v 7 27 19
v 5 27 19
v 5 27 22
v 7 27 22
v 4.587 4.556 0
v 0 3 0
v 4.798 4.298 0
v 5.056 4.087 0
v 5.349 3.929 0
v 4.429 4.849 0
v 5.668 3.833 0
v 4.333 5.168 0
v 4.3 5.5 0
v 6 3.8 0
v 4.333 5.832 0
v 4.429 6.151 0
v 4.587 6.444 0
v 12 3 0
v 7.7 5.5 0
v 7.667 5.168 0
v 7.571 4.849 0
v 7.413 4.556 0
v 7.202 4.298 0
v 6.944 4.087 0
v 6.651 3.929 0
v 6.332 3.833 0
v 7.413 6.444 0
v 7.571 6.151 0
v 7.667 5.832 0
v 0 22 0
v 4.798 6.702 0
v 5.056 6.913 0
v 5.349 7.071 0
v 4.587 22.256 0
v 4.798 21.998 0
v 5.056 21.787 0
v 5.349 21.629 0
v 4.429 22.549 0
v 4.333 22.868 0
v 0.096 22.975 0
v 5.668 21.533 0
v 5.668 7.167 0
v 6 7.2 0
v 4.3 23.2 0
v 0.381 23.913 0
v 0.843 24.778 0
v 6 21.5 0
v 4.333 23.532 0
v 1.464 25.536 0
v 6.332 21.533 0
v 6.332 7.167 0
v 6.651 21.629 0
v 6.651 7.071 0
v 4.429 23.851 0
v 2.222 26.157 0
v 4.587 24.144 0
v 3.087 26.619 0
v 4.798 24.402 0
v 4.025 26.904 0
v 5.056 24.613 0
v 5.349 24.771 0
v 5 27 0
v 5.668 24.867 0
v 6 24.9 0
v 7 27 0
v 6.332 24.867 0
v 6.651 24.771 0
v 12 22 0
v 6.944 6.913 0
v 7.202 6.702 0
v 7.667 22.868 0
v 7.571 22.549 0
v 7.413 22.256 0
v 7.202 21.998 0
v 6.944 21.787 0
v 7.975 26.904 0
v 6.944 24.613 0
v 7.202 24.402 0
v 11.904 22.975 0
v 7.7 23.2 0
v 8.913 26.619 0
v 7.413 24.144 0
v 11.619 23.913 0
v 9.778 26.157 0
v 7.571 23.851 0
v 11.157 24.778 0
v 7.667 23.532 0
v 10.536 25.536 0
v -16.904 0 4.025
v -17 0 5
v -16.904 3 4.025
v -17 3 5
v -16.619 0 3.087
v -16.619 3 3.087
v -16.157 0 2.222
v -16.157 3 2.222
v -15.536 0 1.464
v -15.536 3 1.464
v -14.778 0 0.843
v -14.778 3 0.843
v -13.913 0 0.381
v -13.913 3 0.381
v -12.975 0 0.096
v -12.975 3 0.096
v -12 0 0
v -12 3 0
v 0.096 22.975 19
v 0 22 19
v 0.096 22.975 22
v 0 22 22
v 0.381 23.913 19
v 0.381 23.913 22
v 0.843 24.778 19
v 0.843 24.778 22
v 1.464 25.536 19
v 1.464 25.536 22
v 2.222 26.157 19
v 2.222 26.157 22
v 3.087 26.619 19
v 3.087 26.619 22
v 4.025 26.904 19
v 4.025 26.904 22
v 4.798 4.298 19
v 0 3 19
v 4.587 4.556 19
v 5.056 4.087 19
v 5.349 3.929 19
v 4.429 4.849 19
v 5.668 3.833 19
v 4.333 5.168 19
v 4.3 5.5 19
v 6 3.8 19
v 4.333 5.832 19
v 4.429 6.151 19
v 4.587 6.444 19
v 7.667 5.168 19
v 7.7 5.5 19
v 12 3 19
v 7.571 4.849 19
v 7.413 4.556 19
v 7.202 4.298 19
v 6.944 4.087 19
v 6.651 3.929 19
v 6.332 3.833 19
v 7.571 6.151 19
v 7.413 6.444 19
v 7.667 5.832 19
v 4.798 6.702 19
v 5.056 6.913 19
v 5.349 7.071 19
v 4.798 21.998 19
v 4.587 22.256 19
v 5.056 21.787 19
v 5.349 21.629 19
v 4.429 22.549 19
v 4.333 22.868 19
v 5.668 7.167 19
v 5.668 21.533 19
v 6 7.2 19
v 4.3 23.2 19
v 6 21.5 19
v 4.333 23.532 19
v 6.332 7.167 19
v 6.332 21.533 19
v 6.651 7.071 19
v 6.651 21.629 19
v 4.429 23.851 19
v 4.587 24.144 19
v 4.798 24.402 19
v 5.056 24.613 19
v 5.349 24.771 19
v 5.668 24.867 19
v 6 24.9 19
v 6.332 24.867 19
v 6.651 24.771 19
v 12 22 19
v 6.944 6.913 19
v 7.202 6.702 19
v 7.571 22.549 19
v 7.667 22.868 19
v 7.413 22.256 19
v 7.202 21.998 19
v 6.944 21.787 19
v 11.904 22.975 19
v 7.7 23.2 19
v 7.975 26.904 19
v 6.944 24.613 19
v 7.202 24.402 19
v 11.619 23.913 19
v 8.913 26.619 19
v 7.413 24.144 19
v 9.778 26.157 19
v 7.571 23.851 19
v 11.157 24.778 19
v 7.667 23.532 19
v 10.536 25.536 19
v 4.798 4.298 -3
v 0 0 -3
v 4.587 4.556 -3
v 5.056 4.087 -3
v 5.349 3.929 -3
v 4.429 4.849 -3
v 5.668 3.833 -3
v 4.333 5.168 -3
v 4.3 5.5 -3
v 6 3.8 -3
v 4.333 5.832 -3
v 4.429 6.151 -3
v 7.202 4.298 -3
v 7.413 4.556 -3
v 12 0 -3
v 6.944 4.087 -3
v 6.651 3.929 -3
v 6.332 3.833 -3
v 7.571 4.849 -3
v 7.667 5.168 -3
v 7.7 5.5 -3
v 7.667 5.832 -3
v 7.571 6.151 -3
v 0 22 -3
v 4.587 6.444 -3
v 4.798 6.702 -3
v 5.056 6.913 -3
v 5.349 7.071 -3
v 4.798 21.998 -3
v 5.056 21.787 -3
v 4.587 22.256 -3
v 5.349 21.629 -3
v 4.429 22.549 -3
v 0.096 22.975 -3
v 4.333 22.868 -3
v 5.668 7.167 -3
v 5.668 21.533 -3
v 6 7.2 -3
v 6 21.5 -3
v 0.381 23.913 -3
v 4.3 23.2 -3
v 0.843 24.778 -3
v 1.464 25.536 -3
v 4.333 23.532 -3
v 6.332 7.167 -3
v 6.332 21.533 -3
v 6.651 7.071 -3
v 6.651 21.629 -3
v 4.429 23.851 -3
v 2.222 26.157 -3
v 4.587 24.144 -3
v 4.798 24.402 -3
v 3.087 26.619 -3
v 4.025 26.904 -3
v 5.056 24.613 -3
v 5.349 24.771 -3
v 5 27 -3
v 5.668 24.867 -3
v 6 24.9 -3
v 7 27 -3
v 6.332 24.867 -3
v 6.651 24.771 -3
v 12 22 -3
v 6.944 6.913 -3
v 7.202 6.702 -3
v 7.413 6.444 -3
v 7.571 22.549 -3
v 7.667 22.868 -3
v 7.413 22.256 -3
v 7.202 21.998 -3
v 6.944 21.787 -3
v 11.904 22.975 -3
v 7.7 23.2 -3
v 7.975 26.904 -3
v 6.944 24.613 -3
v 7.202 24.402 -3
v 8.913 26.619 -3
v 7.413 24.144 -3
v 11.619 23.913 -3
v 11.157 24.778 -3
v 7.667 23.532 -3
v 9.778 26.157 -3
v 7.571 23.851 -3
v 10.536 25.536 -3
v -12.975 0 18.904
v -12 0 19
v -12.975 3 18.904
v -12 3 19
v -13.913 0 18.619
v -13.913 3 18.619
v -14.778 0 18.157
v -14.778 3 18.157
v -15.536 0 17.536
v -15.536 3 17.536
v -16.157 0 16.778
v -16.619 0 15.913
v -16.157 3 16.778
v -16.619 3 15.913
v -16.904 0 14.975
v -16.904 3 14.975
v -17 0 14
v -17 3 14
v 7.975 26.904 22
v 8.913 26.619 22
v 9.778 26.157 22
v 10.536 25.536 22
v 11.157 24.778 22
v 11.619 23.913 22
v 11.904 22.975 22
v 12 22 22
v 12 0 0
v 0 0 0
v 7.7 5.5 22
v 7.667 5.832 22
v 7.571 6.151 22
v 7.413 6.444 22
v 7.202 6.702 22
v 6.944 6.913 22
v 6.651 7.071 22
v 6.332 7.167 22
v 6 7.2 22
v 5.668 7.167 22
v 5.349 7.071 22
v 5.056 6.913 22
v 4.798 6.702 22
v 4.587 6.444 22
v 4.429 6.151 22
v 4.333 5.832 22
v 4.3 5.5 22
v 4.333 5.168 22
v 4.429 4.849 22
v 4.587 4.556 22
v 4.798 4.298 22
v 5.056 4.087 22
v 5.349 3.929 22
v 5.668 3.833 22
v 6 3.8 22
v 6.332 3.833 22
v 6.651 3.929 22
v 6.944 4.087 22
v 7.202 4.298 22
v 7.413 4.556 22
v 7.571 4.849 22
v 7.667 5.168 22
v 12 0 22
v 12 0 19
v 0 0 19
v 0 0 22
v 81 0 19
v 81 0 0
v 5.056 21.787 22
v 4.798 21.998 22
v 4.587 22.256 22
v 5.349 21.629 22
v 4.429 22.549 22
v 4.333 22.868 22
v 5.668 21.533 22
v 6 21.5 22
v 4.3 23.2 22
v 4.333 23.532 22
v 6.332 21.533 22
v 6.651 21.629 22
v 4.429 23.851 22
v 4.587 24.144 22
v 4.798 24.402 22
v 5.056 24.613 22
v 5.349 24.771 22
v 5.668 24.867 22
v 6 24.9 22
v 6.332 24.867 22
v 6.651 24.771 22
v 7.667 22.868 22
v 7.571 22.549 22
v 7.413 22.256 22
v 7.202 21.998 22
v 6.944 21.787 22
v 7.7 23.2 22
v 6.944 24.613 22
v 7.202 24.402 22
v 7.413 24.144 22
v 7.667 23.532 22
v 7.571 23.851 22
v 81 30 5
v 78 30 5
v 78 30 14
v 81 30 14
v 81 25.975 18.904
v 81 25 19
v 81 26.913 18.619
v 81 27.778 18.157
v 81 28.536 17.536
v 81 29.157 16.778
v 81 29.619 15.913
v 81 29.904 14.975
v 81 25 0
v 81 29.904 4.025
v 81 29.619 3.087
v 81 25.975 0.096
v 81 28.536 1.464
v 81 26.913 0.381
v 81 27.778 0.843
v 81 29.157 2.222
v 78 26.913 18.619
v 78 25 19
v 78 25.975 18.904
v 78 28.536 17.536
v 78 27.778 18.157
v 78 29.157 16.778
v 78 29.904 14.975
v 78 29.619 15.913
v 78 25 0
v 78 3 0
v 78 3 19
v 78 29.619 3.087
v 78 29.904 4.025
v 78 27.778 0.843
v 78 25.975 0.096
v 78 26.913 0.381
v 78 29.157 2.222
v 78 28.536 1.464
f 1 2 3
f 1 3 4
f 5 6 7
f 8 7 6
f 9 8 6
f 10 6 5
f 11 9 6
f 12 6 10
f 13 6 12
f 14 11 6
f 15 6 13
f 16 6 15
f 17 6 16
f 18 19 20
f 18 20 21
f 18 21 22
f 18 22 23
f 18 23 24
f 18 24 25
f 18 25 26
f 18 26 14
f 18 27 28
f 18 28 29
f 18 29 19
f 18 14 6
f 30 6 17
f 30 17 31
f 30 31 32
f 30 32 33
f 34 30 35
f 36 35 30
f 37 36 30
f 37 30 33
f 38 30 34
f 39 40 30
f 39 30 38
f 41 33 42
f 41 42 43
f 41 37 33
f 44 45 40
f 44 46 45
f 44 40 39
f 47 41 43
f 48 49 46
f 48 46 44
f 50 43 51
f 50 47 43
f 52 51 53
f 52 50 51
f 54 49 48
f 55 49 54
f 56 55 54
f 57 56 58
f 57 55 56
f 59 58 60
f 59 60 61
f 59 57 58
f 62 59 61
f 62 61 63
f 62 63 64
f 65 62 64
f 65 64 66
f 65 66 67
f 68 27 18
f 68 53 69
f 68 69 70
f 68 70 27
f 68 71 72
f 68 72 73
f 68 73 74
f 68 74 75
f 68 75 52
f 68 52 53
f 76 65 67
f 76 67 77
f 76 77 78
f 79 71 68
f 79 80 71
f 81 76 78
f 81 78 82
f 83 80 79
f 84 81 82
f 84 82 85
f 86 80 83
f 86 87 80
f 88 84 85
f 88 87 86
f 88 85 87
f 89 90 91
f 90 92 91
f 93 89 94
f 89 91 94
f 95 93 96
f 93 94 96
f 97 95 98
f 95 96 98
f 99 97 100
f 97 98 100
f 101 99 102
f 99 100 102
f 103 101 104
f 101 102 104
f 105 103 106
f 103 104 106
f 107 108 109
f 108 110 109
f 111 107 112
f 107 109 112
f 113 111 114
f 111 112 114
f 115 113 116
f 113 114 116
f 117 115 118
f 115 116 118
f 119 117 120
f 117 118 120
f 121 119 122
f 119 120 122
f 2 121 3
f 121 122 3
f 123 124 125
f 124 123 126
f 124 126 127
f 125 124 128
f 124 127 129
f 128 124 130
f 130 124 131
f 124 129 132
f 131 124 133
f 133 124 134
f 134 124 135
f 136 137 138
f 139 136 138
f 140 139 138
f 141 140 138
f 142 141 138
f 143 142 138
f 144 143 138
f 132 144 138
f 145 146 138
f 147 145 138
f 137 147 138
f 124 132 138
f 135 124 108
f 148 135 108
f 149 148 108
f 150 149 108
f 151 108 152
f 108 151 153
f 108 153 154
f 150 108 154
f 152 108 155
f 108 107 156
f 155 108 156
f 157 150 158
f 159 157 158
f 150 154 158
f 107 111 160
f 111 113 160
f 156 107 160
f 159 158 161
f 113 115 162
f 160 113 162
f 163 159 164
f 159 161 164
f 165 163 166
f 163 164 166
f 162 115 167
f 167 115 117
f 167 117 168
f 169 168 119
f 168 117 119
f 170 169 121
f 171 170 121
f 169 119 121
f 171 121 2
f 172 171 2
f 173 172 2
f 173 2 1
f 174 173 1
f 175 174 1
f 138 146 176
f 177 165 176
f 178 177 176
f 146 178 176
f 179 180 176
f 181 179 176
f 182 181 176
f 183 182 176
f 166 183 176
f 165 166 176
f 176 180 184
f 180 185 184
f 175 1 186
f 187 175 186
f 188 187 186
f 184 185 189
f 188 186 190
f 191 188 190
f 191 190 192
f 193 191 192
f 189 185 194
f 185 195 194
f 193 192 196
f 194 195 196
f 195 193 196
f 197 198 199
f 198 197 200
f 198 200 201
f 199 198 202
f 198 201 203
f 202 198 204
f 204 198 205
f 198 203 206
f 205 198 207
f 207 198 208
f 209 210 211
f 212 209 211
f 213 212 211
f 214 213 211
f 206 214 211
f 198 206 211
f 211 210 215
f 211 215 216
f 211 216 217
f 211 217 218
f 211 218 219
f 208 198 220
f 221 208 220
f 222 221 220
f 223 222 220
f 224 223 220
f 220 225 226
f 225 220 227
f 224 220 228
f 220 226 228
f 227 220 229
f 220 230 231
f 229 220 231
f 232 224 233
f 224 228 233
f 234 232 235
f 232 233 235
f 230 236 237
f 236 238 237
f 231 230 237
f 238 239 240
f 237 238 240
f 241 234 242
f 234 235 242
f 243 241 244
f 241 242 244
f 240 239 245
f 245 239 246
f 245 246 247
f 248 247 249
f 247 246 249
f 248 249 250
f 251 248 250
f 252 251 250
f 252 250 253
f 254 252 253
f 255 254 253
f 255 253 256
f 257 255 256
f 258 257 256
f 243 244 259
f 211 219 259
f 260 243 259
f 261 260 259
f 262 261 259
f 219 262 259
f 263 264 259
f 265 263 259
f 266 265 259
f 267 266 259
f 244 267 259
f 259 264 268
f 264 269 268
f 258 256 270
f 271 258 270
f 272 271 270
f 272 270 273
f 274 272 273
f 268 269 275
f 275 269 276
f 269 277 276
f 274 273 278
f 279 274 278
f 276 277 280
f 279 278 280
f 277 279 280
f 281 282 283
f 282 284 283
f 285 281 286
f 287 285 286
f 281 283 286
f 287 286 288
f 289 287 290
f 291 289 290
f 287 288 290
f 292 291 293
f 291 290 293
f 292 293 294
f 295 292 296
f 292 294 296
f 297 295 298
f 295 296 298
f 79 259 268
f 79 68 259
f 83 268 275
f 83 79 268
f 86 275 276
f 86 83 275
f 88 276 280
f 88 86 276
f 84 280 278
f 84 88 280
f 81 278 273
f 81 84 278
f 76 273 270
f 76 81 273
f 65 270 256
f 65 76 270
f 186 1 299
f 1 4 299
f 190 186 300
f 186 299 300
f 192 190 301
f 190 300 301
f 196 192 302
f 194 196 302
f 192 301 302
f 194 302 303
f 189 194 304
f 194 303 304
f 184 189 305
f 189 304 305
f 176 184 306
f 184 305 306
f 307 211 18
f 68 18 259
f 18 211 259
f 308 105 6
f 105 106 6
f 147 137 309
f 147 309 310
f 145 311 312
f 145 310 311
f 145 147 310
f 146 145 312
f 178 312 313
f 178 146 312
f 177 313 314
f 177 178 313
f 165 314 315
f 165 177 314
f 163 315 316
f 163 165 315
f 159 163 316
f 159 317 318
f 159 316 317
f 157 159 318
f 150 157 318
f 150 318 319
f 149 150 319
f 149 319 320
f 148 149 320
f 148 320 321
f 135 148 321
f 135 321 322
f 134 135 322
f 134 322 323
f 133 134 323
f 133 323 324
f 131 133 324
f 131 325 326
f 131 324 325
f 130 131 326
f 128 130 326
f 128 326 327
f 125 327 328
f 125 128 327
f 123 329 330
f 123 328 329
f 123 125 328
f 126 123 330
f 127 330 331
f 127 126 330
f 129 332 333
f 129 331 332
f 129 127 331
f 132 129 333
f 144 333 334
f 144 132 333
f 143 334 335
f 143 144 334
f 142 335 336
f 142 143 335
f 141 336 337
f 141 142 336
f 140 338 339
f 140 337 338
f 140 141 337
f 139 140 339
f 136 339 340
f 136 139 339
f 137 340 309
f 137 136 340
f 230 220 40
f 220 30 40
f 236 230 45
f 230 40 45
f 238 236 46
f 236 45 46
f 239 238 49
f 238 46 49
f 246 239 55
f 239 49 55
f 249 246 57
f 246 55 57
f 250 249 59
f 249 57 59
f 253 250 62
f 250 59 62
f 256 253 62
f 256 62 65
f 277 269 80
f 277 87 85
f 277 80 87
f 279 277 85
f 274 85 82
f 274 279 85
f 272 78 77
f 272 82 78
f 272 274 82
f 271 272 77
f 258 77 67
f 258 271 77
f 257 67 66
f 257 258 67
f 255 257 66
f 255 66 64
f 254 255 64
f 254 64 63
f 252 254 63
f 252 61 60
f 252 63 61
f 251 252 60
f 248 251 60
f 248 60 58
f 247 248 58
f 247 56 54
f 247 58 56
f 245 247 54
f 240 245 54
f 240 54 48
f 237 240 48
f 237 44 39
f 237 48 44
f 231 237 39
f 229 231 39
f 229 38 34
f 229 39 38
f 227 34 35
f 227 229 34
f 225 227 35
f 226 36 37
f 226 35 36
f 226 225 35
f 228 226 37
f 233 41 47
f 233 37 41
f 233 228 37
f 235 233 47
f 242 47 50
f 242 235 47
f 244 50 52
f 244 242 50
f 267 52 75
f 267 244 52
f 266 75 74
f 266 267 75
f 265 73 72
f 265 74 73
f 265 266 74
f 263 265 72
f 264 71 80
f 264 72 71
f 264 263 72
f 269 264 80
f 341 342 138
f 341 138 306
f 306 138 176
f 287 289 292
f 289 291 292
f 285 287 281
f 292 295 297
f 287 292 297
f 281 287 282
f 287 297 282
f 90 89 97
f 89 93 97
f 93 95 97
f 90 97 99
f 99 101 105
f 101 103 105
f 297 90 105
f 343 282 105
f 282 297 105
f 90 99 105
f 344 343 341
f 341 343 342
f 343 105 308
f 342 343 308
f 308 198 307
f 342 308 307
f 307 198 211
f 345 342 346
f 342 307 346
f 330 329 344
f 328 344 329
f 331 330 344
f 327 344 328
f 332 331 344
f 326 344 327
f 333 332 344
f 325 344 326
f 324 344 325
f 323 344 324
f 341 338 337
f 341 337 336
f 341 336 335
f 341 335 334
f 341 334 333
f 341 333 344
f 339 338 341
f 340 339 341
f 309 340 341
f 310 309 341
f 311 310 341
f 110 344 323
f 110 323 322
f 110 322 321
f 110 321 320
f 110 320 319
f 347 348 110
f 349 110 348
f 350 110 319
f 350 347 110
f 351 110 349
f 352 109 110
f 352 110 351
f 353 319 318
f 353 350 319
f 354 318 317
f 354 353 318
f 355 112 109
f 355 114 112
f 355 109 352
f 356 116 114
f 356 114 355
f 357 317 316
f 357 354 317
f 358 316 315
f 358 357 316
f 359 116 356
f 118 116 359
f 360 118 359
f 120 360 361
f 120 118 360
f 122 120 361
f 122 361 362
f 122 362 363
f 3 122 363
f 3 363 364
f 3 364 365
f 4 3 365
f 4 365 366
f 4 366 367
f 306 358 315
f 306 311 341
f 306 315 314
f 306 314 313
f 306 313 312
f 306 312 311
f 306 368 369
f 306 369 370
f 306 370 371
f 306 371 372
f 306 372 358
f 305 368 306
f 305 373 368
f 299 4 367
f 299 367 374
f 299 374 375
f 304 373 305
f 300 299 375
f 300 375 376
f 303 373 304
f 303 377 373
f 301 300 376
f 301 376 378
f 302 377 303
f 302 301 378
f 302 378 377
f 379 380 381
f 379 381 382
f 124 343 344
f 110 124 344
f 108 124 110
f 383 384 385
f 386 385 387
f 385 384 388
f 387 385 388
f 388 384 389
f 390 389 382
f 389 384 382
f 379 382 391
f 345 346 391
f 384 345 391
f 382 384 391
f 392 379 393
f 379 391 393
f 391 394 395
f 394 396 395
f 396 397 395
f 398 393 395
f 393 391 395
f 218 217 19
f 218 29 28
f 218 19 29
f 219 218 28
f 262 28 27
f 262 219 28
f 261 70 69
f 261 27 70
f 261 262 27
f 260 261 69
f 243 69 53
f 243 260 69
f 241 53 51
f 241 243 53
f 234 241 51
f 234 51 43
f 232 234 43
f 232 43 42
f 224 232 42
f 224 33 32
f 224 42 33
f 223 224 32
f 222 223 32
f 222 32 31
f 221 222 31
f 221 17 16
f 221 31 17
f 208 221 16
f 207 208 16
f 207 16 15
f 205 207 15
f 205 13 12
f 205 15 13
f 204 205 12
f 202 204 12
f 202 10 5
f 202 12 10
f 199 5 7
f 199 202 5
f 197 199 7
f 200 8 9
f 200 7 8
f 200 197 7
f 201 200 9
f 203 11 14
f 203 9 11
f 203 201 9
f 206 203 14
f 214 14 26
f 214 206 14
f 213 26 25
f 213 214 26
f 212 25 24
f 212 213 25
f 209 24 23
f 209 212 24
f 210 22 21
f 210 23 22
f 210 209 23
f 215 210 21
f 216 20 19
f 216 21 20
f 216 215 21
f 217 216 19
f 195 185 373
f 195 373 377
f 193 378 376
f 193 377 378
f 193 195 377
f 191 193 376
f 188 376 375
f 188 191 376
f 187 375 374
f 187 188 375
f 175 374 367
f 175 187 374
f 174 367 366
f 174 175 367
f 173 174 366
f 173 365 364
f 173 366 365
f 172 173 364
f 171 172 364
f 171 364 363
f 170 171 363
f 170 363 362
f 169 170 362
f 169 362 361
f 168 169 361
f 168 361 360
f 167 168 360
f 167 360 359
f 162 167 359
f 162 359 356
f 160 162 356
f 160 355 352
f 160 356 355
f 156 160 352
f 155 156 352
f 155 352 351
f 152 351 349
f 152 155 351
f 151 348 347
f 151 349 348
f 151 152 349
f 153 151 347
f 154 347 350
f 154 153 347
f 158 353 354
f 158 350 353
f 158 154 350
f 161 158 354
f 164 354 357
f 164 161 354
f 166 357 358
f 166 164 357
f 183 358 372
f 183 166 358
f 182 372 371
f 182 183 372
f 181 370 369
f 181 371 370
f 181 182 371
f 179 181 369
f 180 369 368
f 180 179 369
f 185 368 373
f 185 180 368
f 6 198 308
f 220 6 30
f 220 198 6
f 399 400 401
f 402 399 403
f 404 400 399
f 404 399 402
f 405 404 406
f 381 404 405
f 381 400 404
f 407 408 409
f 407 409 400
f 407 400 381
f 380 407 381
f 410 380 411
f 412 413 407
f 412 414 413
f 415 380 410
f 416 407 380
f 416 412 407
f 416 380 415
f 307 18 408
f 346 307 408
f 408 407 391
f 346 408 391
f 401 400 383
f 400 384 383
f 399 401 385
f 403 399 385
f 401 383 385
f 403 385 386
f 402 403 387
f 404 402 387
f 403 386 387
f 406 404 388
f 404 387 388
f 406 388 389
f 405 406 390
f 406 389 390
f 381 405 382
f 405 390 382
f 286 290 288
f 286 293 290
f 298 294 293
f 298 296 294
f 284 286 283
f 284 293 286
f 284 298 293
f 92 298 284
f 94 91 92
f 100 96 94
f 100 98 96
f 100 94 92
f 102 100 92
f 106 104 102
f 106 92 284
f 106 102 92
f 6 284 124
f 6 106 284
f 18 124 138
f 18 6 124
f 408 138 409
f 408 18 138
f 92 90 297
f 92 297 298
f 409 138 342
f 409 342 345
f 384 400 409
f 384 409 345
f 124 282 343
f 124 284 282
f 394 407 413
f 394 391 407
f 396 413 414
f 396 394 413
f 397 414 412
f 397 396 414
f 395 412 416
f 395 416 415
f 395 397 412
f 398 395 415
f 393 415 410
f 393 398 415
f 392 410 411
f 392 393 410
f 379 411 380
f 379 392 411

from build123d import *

# Parameters (mm, degrees)
CYLINDER001_R     = 1.7
CYLINDER001_DEPTH = 31
CYLINDER_R        = 1.7
CYLINDER_DEPTH    = 31
BOX003_W          = 3
BOX003_H          = 30
BOX003_DEPTH      = 19
BOX001_W          = 12
BOX001_H          = 27
BOX001_DEPTH      = 3
BOX002_W          = 12
BOX002_H          = 27
BOX002_DEPTH      = 3
BOX_W             = 95
BOX_H             = 3
BOX_DEPTH         = 19
FILLET_R          = 5


with BuildPart() as cylinder001:
    # Cylinder001 → Cylinder001 (new body)
    with BuildSketch(Plane(origin=(6, 23.2, -6), x_dir=(1, 0, 0), z_dir=(0, 0, 1))):
        Circle(CYLINDER001_R)
    extrude(amount=CYLINDER001_DEPTH)


with BuildPart() as orificios:
    # Cylinder → Cylinder (new body)
    with BuildSketch(Plane(origin=(6, 5.5, -6), x_dir=(1, 0, 0), z_dir=(0, 0, 1))):
        Circle(CYLINDER_R)
    extrude(amount=CYLINDER_DEPTH)

    # Fusion001: union Cylinder001
    add(cylinder001.part)


with BuildPart() as cube003:
    # Box003 → Box003 (new body)
    with BuildSketch(Plane(origin=(78, 0, 0), x_dir=(1, 0, 0), z_dir=(0, 0, 1))):
        with Locations((1.5, 15)):
            Rectangle(BOX003_W, BOX003_H)
    extrude(amount=BOX003_DEPTH)


with BuildPart() as cube001:
    # Box001 → Box001 (new body)
    with BuildSketch(Plane.XY.offset(-3)):
        with Locations((6, 13.5)):
            Rectangle(BOX001_W, BOX001_H)
    extrude(amount=BOX001_DEPTH)


with BuildPart() as cube002:
    # Box002 → Box002 (new body)
    with BuildSketch(Plane.XY.offset(19)):
        with Locations((6, 13.5)):
            Rectangle(BOX002_W, BOX002_H)
    extrude(amount=BOX002_DEPTH)


with BuildPart() as cut:
    # Box → Box (new body)
    with BuildSketch(Plane(origin=(-17, 0, 0), x_dir=(1, 0, 0), z_dir=(0, 0, 1))):
        with Locations((47.5, 1.5)):
            Rectangle(BOX_W, BOX_H)
    extrude(amount=BOX_DEPTH)

    # Fusion: union Cube003, Cube001, Cube002
    add(cube003.part)
    add(cube001.part)
    add(cube002.part)

    # Fillet
    fillet_edges = [cut.edges().sort_by_distance(p)[0] for p in [
        (79.5, 30, 0),
        (79.5, 30, 19),
        (0, 27, 20.5),
        (12, 27, 20.5),
        (-17, 1.5, 19),
        (-17, 1.5, 0),
        (0, 27, -1.5),
        (12, 27, -1.5),
    ]]
    fillet(fillet_edges, radius=FILLET_R)

    # Cut: cut orificios
    add(orificios.part, mode=Mode.SUBTRACT)


solid = cut.part
